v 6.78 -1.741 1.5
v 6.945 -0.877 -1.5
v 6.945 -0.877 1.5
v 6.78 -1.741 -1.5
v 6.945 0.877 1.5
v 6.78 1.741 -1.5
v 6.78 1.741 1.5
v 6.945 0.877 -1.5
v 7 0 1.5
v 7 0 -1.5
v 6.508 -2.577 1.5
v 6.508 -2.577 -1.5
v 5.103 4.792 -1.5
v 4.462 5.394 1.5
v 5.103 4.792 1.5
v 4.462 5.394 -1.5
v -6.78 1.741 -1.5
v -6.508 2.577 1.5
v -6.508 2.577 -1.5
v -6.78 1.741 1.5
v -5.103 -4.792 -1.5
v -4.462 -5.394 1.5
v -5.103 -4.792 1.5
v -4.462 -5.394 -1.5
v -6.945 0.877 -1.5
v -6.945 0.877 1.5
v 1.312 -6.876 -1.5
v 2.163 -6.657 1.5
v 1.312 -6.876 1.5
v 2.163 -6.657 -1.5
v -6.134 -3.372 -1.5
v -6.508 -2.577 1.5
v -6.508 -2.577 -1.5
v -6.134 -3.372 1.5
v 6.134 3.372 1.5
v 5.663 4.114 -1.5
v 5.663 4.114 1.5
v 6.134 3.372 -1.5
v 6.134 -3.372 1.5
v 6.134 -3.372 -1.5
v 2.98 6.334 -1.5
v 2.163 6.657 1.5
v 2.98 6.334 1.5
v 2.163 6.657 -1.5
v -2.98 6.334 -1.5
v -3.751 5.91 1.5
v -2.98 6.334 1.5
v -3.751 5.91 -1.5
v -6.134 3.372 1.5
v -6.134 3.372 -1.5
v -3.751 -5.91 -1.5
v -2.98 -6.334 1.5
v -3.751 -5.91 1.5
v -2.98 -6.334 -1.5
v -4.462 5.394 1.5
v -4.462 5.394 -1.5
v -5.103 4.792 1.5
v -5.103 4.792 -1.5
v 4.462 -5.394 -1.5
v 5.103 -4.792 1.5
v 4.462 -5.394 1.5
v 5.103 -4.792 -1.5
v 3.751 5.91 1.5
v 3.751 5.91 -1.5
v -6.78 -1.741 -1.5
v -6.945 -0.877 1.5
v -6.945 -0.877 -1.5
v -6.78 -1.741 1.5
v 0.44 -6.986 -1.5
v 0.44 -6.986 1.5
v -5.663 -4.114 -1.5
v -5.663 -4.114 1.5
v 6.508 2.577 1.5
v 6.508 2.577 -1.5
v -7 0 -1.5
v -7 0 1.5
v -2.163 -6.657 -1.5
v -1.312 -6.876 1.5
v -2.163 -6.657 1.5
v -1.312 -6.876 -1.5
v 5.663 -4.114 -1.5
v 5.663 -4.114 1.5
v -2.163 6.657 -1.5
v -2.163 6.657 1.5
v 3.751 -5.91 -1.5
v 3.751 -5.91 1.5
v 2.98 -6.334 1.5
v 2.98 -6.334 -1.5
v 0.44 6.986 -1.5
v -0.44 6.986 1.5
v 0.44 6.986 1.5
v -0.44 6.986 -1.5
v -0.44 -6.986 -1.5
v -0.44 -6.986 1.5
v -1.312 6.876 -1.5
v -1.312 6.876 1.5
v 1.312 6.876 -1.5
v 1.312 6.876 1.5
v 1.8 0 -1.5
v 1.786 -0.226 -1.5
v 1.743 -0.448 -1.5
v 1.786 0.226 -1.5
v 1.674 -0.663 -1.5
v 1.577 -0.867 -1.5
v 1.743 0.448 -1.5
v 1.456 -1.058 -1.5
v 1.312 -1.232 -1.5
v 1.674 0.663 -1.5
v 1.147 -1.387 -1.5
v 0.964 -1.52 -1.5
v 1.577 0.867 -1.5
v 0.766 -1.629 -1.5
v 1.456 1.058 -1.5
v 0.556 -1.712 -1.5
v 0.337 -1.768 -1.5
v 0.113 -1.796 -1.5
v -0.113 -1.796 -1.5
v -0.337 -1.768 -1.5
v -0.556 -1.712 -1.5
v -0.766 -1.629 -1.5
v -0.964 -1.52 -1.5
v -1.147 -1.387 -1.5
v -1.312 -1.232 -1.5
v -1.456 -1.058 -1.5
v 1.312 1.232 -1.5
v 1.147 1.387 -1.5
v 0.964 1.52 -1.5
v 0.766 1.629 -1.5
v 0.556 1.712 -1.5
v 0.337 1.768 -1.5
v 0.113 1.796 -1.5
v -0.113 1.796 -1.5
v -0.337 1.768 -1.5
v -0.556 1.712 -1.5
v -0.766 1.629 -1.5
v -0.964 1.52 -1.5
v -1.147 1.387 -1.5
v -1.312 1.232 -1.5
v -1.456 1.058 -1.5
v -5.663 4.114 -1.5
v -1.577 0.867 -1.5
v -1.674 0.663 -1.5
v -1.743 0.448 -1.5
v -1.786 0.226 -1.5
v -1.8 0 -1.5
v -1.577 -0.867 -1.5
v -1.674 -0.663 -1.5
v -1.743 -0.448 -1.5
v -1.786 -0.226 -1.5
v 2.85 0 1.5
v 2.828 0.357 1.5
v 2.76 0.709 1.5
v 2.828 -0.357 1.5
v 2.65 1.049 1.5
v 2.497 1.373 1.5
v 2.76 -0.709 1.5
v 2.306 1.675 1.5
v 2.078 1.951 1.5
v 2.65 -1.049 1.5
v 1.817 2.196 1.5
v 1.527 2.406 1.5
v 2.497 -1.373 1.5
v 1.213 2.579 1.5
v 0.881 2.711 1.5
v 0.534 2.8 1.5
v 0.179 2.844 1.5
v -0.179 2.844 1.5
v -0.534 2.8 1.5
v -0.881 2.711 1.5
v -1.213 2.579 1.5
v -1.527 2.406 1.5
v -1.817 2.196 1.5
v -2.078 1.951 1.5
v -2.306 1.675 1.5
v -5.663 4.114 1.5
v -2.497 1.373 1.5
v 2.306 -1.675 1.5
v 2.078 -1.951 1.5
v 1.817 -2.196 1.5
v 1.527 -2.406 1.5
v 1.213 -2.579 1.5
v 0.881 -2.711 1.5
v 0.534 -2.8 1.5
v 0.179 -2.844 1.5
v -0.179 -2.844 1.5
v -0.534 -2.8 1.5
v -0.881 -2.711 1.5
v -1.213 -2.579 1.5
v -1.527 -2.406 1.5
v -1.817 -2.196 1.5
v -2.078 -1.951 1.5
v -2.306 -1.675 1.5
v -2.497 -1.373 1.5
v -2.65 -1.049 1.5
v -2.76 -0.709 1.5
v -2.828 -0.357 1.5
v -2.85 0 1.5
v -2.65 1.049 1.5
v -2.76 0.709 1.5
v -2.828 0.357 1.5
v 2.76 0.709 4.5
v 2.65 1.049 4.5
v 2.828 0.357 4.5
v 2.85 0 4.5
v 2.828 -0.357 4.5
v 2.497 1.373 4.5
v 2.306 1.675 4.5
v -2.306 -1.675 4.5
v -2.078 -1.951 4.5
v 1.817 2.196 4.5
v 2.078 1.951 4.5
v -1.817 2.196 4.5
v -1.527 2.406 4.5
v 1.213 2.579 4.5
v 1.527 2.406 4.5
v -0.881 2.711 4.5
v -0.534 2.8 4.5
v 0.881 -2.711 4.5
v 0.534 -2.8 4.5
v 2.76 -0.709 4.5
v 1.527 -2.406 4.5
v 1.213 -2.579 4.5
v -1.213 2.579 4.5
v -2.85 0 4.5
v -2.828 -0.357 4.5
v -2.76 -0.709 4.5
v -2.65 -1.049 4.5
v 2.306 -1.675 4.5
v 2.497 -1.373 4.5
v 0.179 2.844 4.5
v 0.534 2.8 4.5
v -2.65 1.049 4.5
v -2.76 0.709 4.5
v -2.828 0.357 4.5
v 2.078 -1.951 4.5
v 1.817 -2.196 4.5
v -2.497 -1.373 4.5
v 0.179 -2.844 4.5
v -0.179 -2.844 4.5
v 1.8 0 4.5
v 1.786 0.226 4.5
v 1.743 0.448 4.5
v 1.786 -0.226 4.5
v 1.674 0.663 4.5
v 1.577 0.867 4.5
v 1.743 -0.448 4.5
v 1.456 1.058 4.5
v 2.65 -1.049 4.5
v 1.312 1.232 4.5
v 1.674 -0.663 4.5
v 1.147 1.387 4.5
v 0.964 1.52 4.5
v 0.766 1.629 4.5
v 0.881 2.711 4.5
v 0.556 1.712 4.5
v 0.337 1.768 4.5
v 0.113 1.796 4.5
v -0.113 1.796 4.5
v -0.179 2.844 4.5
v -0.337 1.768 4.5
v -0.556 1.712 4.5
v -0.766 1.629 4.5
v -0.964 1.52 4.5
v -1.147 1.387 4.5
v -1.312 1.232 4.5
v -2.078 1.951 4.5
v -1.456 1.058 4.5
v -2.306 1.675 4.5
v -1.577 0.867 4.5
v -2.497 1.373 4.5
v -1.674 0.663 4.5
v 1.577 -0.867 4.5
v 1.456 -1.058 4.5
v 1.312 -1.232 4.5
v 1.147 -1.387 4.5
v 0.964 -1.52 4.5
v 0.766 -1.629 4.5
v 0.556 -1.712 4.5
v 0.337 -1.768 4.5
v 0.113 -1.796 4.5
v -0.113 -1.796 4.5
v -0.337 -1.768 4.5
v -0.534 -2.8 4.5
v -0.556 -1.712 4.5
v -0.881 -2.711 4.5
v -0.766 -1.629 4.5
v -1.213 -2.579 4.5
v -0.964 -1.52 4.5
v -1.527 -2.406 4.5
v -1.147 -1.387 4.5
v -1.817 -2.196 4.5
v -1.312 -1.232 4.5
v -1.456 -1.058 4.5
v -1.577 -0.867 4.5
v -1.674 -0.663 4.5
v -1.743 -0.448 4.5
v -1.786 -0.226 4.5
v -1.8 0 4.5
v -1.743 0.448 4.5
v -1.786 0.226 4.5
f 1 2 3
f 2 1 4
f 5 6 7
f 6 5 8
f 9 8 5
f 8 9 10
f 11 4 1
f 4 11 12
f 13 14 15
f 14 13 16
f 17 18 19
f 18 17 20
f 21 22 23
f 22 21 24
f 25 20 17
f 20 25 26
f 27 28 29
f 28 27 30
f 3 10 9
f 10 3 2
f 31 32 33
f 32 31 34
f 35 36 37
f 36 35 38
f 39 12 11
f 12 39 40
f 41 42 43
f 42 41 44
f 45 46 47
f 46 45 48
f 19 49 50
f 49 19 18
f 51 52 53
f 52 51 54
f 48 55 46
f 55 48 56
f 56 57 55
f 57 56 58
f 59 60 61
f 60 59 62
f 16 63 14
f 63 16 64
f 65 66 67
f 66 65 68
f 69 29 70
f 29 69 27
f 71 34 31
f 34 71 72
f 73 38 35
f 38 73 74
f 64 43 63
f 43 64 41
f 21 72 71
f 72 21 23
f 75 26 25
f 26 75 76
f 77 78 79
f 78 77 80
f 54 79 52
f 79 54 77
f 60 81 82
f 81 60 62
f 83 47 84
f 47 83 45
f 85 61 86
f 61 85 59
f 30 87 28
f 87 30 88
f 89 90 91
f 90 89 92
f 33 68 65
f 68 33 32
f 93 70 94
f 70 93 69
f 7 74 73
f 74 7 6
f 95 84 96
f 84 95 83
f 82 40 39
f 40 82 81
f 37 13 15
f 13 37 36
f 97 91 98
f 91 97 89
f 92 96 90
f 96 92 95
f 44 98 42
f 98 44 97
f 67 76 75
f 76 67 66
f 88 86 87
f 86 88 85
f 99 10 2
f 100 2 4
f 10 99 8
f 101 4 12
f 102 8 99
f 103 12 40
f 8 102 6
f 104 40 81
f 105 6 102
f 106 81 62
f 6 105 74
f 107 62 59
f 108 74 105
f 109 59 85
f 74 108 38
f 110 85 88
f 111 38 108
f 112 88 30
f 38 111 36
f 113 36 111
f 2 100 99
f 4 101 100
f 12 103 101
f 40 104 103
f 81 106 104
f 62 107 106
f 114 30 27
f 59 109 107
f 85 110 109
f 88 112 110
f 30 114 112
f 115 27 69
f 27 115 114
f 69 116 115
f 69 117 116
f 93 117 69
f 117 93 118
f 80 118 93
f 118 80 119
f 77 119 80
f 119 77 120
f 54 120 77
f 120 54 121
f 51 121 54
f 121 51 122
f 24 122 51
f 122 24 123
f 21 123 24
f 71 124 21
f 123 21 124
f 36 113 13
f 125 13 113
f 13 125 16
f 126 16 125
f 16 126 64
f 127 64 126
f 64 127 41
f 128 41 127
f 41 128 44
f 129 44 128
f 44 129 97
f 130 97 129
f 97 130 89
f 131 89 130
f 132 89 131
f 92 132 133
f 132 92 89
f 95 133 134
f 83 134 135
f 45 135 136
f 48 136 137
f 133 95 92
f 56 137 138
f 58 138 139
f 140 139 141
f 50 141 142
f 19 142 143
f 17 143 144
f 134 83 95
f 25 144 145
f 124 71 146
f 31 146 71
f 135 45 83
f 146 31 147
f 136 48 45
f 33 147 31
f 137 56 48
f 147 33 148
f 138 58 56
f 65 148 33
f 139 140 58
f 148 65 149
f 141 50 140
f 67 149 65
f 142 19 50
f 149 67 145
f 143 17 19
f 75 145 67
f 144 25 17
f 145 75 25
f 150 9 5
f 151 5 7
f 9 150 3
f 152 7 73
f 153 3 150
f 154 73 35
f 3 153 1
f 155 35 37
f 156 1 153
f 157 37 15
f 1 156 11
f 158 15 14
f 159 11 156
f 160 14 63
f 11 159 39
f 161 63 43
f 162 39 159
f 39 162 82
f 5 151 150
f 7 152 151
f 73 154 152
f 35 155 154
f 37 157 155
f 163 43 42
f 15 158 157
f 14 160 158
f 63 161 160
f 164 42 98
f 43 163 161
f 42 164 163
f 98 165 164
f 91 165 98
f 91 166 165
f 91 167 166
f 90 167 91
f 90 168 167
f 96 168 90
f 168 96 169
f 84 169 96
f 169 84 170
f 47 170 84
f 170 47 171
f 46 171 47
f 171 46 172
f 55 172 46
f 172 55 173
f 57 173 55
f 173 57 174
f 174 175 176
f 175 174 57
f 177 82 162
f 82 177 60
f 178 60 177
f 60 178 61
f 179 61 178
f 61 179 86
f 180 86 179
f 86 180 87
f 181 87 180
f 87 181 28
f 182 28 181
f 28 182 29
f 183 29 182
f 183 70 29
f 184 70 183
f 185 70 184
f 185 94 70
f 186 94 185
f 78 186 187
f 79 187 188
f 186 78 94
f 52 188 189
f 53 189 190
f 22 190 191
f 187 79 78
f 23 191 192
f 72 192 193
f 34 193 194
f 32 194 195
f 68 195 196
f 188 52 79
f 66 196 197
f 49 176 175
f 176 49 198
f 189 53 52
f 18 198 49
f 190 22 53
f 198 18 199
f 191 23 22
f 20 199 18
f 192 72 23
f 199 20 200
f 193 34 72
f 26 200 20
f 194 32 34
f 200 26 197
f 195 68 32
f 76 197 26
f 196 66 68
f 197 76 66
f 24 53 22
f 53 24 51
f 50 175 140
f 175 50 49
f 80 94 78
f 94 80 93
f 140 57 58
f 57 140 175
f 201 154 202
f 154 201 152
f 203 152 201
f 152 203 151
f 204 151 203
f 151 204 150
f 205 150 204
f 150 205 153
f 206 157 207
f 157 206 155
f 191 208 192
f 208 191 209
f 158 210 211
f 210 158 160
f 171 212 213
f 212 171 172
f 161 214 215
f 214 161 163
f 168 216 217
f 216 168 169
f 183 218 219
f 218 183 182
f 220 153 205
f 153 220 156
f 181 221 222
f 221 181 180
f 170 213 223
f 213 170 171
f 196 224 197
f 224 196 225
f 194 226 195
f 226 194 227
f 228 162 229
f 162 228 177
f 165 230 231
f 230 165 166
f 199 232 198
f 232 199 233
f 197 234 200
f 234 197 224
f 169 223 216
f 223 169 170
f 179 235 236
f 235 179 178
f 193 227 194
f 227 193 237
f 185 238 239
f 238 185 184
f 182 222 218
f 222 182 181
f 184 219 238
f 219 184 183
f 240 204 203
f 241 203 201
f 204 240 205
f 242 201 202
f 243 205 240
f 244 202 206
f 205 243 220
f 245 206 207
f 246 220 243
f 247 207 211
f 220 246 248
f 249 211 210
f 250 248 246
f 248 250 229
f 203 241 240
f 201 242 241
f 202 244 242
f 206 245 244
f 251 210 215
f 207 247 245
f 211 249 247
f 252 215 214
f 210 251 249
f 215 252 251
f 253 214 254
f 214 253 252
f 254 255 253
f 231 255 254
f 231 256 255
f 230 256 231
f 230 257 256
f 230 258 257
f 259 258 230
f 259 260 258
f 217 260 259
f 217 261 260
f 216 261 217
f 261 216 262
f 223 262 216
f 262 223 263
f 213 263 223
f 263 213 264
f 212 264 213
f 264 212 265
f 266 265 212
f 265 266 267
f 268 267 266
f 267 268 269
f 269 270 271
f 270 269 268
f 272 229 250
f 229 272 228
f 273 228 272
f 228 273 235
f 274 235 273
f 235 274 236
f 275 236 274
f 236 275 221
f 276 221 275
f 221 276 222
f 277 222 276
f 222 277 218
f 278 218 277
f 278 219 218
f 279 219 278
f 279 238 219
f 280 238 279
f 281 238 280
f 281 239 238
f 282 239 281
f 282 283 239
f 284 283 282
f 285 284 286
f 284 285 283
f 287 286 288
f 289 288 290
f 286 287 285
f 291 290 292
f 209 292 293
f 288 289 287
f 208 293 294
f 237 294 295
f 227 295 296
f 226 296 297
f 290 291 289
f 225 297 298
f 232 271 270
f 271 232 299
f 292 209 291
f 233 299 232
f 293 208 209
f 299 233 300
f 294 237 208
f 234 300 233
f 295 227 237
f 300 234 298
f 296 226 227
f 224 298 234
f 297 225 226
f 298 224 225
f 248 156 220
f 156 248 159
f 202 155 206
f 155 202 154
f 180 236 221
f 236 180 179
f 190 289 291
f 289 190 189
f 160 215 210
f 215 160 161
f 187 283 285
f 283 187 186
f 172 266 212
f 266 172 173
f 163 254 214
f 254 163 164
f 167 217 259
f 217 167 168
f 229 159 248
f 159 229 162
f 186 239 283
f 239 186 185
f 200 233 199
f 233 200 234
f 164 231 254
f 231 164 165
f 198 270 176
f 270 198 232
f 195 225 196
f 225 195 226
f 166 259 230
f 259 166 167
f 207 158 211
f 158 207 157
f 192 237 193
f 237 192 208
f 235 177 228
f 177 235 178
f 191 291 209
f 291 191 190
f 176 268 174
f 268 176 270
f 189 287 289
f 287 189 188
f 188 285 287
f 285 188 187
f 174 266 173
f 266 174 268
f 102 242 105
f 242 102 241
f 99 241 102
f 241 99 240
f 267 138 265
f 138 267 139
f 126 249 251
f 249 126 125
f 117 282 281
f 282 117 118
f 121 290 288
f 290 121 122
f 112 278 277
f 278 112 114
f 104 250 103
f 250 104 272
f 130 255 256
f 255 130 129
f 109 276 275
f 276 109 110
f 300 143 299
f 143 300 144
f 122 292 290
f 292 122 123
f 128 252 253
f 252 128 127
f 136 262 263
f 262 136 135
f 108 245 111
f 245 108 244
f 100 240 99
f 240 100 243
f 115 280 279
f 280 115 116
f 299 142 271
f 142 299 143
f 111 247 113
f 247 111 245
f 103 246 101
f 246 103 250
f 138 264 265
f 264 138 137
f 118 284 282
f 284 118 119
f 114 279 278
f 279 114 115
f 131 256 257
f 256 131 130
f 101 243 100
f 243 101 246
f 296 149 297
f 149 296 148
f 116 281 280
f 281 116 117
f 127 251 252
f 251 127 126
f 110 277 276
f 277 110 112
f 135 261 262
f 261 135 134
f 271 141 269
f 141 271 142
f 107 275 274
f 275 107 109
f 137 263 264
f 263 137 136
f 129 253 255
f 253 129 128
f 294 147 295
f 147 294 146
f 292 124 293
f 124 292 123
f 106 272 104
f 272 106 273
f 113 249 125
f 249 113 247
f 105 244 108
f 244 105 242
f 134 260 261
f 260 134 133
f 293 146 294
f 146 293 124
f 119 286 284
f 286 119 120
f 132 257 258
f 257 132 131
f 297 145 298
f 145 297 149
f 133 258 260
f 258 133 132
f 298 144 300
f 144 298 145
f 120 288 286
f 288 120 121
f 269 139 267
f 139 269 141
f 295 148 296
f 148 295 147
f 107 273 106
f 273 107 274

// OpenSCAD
$fn = 50;


difference() {
	union() {
		translate(v = [0, 0, -1.5000000000]) {
			cylinder(h = 3, r = 7.0000000000);
		}
		translate(v = [0, 0, -1.5000000000]) {
			cylinder(h = 6, r = 2.8500000000);
		}
	}
	union() {
		translate(v = [0, 0, -100.0000000000]) {
			cylinder(h = 200, r = 1.8000000000);
		}
	}
}
